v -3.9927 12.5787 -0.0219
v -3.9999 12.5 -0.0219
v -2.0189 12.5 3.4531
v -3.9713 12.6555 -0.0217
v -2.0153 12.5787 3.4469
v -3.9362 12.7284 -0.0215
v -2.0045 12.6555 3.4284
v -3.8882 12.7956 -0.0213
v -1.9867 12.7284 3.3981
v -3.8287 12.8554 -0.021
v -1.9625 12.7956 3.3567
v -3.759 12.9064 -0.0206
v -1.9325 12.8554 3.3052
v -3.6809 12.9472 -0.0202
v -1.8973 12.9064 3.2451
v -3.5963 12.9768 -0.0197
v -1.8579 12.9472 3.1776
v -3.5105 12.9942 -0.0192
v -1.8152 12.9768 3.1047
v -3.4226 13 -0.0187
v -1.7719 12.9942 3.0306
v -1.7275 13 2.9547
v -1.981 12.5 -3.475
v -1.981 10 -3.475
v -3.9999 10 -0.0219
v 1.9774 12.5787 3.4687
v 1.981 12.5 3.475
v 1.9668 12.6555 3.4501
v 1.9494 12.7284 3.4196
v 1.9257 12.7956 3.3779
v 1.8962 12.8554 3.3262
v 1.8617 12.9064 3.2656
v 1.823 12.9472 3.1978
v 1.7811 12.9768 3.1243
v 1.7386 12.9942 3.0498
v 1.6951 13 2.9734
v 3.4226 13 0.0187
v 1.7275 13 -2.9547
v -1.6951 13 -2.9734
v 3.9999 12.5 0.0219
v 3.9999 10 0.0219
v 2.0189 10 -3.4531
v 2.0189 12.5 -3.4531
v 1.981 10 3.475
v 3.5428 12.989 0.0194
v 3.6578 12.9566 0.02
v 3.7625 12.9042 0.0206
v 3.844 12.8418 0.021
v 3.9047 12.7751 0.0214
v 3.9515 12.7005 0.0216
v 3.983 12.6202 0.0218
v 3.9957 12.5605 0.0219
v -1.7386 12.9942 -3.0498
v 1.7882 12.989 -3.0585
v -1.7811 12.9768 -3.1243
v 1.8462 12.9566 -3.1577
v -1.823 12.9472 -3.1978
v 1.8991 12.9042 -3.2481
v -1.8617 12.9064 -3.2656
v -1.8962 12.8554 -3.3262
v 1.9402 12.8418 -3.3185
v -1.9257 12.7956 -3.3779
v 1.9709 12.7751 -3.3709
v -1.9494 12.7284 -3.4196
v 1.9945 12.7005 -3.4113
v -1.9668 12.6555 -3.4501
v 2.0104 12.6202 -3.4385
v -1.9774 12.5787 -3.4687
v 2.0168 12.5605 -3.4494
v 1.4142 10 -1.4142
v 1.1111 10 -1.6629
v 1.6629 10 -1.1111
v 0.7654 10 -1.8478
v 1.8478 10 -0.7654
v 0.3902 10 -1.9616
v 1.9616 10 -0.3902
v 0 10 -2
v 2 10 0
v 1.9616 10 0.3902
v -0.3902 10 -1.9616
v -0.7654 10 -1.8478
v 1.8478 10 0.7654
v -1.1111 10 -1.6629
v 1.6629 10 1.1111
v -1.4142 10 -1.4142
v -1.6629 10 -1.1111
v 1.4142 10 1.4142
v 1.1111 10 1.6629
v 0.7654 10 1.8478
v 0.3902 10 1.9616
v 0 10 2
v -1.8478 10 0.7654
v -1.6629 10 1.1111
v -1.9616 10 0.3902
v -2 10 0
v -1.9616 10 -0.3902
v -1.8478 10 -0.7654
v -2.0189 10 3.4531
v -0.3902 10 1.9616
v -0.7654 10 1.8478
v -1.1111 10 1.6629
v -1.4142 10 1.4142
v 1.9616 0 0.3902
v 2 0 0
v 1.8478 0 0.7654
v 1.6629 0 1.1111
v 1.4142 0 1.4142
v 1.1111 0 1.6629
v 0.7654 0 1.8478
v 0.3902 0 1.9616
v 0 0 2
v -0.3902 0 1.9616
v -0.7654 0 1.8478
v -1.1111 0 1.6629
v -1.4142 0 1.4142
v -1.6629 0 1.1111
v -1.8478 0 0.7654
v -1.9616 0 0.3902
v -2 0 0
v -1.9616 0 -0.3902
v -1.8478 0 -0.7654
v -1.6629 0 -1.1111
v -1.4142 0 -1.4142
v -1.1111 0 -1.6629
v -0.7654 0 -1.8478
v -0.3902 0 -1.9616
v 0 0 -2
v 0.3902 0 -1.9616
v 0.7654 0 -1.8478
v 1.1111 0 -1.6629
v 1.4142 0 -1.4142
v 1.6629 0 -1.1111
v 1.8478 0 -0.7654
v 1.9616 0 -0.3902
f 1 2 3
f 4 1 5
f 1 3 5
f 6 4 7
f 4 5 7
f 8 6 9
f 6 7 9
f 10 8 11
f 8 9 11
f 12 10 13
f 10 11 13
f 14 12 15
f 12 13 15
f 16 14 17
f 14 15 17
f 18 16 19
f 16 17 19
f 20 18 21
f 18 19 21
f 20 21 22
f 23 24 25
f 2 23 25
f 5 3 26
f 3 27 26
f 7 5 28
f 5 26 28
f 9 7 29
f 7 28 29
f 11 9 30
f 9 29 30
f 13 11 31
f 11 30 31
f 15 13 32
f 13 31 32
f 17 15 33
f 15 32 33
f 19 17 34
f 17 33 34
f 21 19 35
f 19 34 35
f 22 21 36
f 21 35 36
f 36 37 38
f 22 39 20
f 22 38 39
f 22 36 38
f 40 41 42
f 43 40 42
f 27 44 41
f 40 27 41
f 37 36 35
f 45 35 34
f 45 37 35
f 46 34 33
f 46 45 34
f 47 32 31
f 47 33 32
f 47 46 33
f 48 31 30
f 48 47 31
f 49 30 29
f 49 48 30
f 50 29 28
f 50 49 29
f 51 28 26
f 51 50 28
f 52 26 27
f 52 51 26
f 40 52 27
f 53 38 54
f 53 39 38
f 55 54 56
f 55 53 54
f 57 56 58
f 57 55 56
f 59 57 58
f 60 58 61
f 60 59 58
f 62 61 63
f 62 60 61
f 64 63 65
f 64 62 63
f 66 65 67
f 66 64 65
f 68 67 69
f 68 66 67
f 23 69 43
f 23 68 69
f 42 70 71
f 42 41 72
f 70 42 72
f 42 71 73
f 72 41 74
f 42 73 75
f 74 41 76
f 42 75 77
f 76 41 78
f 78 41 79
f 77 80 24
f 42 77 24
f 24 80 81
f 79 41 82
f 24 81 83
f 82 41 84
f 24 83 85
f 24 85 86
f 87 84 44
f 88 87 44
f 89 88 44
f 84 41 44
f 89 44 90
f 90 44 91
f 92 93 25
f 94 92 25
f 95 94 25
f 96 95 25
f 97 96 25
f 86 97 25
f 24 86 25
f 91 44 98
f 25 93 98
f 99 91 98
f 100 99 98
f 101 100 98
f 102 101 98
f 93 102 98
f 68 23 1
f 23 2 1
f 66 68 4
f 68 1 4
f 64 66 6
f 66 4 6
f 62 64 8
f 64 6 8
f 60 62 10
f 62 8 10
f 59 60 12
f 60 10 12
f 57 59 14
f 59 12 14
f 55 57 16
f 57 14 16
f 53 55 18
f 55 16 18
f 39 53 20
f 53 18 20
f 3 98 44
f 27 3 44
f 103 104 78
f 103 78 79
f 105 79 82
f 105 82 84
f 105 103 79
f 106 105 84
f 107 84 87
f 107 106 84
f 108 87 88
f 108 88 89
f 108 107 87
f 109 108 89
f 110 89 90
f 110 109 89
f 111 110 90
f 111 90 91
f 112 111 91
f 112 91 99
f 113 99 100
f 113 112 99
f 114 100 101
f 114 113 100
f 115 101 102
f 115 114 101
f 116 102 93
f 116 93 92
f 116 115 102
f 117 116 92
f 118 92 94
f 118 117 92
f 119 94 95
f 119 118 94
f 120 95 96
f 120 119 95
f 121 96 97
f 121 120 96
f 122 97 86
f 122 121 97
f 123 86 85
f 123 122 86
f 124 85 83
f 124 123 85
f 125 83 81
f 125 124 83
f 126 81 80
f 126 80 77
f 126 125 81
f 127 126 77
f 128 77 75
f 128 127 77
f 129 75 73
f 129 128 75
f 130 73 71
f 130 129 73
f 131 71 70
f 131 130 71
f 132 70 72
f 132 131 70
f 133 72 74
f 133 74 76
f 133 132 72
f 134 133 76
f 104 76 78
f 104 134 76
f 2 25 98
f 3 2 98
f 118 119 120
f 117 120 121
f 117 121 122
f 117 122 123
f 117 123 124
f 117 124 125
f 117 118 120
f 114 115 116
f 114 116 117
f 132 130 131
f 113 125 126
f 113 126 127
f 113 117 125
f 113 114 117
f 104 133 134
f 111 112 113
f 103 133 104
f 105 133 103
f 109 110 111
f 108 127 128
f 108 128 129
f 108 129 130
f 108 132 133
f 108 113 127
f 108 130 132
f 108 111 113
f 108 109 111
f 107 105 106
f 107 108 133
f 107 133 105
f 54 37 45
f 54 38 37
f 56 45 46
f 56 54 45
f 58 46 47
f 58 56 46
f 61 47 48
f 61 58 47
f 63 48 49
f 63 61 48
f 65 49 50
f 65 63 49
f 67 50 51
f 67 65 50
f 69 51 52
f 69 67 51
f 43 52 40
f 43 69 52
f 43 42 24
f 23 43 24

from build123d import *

# Parameters (mm, degrees)
F0_R     = 2
F1_DEPTH = 10
F3_DEPTH = 3
F4_R     = 0.5


with BuildPart() as f1:
    # F0 (on Front) → F1 (new body)
    with BuildSketch(Plane.XZ):
        Circle(F0_R)
    extrude(amount=-F1_DEPTH)

    # F2 (on face) → F3 (join)
    with BuildSketch(Plane(origin=(0, 10, 0), x_dir=(-1, 0, 0), z_dir=(0, 1, 0))):
        Polygon((3.99994, -0.021899), (2.018935, 3.4531), (-1.981005, 3.474999), (-3.99994, 0.021899), (-2.018935, -3.4531), (1.981005, -3.474999), align=None)
    extrude(amount=F3_DEPTH)

    # F4
    f4_edges = [f1.edges().sort_by_distance(p)[0] for p in [
        (-2.990473, 13, -1.748449),
        (-3.009437, 13, 1.715601),
        (-0.018965, 13, 3.46405),
        (2.990473, 13, 1.748449),
        (3.009437, 13, -1.715601),
        (0.018965, 13, -3.46405),
    ]]
    fillet(f4_edges, radius=F4_R)


solid = f1.part
